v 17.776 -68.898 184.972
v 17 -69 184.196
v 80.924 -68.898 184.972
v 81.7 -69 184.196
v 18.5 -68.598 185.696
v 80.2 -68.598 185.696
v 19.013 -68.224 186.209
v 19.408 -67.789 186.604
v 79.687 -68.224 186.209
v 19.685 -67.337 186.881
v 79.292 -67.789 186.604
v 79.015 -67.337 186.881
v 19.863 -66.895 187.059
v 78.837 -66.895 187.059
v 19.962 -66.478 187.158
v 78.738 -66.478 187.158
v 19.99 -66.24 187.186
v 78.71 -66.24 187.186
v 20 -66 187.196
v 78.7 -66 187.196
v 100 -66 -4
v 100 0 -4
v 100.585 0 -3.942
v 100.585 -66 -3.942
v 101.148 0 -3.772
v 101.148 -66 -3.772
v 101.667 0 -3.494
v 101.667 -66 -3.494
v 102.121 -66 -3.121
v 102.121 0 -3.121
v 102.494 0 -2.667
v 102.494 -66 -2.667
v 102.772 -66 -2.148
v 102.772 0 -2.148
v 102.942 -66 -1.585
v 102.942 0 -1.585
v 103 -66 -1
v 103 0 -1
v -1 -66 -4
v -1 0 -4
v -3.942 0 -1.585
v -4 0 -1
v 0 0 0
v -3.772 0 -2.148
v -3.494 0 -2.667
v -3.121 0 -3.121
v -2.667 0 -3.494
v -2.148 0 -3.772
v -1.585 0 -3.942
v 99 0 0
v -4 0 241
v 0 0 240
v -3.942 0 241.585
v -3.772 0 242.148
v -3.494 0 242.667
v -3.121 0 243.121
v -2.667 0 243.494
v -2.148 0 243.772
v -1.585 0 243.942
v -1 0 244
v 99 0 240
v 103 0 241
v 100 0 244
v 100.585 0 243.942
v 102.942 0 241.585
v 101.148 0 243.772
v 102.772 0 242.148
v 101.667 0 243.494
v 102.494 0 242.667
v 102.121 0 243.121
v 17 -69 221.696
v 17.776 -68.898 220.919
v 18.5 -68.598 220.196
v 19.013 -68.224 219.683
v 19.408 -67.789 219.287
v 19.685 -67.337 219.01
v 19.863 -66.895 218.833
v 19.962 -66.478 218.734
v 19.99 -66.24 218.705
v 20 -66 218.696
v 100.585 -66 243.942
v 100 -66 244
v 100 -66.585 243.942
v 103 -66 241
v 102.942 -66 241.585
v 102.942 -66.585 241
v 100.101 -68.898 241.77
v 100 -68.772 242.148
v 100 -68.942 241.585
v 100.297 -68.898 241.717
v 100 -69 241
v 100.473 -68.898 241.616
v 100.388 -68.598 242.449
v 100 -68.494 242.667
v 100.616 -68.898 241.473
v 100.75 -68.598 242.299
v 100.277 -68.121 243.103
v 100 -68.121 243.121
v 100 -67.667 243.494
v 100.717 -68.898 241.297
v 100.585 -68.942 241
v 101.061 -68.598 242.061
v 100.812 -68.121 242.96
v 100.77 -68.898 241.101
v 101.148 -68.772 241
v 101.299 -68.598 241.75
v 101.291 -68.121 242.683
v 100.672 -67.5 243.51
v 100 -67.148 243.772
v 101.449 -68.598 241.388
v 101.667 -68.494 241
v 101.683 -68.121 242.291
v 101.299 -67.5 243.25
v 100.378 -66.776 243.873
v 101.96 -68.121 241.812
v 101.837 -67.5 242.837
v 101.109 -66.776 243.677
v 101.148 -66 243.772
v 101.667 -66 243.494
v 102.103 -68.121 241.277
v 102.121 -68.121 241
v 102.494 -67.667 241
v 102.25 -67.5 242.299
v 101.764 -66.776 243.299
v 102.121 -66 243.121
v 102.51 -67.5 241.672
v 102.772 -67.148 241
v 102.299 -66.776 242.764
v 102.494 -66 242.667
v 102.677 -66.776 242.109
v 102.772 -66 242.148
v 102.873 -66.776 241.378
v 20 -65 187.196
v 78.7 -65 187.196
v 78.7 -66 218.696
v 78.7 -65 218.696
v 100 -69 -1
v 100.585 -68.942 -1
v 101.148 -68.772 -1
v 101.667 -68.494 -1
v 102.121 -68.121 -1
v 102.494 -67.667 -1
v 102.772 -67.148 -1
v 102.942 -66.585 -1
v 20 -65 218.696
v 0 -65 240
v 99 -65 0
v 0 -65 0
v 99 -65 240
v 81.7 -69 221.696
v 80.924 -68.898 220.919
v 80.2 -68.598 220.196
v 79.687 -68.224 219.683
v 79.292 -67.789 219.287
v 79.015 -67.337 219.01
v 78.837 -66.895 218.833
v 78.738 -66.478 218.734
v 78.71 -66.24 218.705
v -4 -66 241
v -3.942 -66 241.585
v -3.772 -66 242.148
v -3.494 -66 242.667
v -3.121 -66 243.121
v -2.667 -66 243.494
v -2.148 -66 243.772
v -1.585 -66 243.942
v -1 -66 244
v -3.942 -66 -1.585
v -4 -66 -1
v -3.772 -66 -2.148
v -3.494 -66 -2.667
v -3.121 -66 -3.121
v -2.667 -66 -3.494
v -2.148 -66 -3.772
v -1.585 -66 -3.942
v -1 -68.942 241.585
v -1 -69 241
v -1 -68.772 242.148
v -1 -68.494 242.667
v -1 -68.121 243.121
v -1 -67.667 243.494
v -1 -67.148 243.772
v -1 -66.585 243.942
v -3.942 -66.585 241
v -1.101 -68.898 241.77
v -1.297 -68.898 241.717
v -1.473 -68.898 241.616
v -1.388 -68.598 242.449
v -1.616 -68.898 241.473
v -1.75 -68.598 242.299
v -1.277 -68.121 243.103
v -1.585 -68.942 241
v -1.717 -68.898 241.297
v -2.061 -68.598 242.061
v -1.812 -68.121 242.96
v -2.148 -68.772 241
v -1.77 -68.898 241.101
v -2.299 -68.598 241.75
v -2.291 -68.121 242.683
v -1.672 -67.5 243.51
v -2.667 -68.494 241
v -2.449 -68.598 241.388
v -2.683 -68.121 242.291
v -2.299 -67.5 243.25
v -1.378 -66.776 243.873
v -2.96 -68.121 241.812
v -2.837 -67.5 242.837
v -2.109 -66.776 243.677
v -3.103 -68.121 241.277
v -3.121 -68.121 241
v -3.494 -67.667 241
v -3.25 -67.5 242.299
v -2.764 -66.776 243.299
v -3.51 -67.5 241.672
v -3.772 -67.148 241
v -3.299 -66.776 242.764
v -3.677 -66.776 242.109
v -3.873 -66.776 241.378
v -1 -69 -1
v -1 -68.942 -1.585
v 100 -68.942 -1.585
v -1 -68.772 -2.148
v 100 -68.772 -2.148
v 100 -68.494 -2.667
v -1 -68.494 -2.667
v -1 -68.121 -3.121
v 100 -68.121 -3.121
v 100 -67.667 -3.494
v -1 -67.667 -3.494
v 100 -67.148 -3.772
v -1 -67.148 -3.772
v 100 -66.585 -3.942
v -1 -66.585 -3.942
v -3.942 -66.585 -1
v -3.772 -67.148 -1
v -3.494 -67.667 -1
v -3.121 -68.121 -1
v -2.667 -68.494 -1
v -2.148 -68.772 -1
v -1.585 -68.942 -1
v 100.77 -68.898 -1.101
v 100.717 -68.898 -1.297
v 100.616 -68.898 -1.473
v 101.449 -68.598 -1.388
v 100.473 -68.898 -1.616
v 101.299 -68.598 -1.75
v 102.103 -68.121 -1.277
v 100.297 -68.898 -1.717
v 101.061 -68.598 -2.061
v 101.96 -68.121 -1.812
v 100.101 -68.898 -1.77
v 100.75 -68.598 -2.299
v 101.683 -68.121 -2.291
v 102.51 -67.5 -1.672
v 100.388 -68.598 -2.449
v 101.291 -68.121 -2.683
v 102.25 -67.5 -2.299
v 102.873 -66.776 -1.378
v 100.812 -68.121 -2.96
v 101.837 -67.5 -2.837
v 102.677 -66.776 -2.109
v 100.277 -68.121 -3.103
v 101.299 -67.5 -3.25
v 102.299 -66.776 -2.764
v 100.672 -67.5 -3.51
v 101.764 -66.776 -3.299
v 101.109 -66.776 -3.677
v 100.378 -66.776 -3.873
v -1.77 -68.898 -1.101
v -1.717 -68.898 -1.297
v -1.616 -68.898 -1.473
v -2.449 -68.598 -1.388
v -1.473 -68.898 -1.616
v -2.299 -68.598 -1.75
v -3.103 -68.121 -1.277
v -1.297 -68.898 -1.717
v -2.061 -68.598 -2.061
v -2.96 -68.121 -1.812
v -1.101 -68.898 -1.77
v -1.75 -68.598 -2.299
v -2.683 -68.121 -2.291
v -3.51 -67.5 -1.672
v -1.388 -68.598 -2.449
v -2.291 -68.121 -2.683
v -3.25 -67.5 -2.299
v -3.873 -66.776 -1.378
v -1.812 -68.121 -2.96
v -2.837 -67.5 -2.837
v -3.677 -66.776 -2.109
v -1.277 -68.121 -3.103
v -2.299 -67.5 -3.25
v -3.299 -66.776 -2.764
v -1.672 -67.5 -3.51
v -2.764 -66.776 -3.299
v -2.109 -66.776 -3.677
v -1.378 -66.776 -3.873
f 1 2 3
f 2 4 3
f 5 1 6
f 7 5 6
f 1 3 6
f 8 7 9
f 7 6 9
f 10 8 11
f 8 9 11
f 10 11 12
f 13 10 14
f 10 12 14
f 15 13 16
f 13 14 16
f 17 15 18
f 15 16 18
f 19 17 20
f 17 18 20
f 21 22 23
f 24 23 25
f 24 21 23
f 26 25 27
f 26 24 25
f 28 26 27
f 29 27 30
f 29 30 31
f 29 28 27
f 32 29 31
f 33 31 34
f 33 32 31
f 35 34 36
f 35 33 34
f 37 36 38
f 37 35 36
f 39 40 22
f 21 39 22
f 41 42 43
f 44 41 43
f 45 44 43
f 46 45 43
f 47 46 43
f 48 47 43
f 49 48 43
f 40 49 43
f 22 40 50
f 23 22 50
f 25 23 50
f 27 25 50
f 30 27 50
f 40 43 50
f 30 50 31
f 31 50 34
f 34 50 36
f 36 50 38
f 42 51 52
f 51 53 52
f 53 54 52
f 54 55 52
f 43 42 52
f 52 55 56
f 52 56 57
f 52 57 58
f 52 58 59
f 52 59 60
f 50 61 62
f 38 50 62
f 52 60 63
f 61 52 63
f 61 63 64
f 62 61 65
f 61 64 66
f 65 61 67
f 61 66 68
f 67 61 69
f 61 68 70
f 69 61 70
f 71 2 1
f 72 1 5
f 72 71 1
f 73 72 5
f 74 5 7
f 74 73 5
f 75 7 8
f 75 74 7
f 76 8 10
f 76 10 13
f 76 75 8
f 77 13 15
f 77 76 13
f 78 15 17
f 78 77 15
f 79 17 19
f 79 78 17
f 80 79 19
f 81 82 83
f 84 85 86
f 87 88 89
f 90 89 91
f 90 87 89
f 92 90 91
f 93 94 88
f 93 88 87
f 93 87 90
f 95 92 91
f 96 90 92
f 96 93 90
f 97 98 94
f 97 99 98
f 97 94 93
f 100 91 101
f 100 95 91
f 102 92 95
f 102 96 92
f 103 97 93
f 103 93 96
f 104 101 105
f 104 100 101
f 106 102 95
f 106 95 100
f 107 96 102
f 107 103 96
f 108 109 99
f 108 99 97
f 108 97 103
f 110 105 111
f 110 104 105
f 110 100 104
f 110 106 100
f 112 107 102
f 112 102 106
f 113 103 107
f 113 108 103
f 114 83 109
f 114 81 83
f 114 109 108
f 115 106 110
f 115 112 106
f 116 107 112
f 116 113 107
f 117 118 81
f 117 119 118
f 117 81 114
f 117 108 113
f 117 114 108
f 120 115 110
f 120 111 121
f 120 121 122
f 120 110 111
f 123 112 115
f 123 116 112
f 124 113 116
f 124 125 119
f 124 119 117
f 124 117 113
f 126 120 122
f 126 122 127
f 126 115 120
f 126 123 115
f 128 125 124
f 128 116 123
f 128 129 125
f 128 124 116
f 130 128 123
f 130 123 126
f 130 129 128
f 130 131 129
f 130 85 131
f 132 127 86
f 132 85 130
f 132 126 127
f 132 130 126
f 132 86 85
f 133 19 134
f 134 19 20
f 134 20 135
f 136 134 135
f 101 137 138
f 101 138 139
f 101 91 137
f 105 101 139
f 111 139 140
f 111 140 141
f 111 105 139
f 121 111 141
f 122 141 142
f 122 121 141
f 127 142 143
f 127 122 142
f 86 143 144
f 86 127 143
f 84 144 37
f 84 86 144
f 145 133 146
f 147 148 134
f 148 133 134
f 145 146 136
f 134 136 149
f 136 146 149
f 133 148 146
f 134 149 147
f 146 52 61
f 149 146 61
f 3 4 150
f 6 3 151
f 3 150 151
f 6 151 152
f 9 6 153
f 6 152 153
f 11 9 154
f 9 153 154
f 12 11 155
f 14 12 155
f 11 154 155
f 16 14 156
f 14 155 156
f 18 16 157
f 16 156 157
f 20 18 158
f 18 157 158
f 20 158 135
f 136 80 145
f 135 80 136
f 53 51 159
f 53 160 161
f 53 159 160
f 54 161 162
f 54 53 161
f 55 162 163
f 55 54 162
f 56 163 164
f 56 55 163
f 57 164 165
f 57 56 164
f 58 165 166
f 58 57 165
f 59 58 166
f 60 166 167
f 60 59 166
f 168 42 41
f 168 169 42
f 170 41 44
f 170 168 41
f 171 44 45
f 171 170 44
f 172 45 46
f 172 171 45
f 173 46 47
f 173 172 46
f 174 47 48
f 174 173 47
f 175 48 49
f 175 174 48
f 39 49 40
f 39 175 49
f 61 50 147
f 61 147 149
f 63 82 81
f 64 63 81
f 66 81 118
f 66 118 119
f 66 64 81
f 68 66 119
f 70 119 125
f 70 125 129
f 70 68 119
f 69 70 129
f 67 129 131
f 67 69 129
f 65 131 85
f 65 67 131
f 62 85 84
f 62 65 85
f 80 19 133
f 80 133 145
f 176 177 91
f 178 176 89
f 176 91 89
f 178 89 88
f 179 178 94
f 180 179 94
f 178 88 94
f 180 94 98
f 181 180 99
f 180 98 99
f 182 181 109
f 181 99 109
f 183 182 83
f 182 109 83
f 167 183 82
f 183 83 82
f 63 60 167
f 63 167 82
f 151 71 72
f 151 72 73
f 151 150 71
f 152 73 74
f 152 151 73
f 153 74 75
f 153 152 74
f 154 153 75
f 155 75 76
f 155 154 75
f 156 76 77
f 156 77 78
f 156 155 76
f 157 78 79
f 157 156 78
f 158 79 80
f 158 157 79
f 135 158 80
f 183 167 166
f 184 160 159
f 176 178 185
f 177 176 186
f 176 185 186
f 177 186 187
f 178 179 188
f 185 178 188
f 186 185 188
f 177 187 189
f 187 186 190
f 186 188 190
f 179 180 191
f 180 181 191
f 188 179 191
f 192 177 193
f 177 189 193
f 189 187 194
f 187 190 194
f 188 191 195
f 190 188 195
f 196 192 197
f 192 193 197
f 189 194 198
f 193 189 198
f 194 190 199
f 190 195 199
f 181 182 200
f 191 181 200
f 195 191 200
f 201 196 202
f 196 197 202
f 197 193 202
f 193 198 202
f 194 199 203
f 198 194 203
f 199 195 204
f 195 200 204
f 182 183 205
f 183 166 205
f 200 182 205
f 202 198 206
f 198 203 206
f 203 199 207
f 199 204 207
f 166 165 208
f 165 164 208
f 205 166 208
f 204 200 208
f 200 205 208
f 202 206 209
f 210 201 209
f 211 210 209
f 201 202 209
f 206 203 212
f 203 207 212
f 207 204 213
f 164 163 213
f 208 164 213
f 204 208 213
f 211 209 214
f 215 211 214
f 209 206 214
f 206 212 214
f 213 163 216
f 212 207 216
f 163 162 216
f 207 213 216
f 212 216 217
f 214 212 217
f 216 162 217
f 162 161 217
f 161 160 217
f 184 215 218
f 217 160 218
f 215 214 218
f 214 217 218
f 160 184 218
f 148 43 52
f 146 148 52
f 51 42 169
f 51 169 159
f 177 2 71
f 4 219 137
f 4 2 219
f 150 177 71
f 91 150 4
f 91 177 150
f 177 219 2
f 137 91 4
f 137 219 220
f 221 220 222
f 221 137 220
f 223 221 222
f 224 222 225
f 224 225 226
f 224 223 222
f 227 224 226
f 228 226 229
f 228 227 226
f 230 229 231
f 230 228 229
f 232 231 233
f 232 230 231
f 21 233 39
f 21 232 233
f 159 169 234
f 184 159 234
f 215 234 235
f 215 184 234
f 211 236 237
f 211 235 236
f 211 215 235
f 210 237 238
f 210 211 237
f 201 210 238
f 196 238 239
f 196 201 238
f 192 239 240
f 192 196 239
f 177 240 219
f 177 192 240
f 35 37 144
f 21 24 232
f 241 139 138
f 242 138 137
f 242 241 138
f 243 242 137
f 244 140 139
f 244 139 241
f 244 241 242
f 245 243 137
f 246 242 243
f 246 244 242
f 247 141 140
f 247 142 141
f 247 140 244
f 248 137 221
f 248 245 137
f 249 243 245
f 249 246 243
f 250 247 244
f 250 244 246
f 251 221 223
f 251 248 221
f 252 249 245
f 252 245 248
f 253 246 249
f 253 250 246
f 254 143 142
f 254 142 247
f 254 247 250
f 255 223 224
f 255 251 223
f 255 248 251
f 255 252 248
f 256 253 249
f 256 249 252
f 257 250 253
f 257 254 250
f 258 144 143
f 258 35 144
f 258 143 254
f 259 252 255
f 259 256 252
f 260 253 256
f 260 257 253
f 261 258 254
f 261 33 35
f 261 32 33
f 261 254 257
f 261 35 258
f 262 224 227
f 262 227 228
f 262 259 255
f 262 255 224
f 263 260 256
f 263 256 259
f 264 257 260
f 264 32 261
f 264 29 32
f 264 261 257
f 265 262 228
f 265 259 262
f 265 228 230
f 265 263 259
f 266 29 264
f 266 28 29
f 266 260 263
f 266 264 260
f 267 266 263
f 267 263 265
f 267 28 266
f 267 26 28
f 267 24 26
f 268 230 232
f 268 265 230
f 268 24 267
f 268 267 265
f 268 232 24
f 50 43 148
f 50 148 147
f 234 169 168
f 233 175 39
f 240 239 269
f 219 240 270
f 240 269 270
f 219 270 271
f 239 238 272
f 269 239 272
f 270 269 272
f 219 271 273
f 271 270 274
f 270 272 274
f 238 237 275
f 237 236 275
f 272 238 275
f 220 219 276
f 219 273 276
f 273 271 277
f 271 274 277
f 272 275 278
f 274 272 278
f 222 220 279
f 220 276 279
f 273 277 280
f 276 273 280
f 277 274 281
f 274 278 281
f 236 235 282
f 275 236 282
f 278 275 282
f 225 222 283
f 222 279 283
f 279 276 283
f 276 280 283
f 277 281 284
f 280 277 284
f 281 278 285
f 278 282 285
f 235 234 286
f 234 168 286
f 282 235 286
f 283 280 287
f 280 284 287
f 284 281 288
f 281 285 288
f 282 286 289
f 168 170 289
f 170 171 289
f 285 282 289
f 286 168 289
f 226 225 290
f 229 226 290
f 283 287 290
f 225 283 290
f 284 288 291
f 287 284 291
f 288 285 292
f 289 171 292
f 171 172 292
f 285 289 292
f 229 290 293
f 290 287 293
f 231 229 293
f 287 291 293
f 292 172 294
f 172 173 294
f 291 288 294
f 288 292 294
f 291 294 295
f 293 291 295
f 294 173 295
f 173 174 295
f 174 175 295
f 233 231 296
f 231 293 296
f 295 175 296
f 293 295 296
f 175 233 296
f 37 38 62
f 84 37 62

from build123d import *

# Parameters (mm, degrees)
F0_W     = 107
F0_H     = 248
F0_W_2   = 99
F0_H_2   = 240
F1_DEPTH = 65
F2_W     = 107
F2_H     = 248
F2_W_2   = 99
F2_H_2   = 240
F3_DEPTH = 4
F4_W     = 58.7
F4_H     = 31.5
F5_DEPTH = 25
F6_R     = 3


with BuildPart() as f1:
    # F0 (on Front) → F1 (new body)
    with BuildSketch(Plane.XZ):
        with Locations((49.5, 120)):
            Rectangle(F0_W, F0_H)
        with Locations((49.5, 120)):
            Rectangle(F0_W_2, F0_H_2, mode=Mode.SUBTRACT)
    extrude(amount=F1_DEPTH)

    # F2 (on face) → F3 (join)
    with BuildSketch(Plane.XZ.offset(65)):
        with Locations((49.5, 120)):
            Rectangle(F2_W, F2_H)
        with Locations((49.5, 120)):
            Rectangle(F2_W_2, F2_H_2, mode=Mode.SUBTRACT)
        with Locations((49.5, 120)):
            Rectangle(F2_W_2, F2_H_2)
    extrude(amount=F3_DEPTH)

    # F4 (on face) → F5 (cut)
    with BuildSketch(Plane.XZ.offset(69)):
        with Locations((49.35, 202.9458682446)):
            Rectangle(F4_W, F4_H)
    extrude(amount=-F5_DEPTH, mode=Mode.SUBTRACT)

    # F6
    f6_edges = [f1.edges().sort_by_distance(p)[0] for p in [
        (-4, -34.5, 244),
        (103, -34.5, 244),
        (-4, -34.5, -4),
        (103, -34.5, -4),
        (49.5, -69, 244),
        (103, -69, 120),
        (-4, -69, 120),
        (49.5, -69, -4),
        (49.35, -69, 218.695868),
        (20, -69, 202.945868),
        (49.35, -69, 187.195868),
        (78.7, -69, 202.945868),
    ]]
    fillet(f6_edges, radius=F6_R)


solid = f1.part
